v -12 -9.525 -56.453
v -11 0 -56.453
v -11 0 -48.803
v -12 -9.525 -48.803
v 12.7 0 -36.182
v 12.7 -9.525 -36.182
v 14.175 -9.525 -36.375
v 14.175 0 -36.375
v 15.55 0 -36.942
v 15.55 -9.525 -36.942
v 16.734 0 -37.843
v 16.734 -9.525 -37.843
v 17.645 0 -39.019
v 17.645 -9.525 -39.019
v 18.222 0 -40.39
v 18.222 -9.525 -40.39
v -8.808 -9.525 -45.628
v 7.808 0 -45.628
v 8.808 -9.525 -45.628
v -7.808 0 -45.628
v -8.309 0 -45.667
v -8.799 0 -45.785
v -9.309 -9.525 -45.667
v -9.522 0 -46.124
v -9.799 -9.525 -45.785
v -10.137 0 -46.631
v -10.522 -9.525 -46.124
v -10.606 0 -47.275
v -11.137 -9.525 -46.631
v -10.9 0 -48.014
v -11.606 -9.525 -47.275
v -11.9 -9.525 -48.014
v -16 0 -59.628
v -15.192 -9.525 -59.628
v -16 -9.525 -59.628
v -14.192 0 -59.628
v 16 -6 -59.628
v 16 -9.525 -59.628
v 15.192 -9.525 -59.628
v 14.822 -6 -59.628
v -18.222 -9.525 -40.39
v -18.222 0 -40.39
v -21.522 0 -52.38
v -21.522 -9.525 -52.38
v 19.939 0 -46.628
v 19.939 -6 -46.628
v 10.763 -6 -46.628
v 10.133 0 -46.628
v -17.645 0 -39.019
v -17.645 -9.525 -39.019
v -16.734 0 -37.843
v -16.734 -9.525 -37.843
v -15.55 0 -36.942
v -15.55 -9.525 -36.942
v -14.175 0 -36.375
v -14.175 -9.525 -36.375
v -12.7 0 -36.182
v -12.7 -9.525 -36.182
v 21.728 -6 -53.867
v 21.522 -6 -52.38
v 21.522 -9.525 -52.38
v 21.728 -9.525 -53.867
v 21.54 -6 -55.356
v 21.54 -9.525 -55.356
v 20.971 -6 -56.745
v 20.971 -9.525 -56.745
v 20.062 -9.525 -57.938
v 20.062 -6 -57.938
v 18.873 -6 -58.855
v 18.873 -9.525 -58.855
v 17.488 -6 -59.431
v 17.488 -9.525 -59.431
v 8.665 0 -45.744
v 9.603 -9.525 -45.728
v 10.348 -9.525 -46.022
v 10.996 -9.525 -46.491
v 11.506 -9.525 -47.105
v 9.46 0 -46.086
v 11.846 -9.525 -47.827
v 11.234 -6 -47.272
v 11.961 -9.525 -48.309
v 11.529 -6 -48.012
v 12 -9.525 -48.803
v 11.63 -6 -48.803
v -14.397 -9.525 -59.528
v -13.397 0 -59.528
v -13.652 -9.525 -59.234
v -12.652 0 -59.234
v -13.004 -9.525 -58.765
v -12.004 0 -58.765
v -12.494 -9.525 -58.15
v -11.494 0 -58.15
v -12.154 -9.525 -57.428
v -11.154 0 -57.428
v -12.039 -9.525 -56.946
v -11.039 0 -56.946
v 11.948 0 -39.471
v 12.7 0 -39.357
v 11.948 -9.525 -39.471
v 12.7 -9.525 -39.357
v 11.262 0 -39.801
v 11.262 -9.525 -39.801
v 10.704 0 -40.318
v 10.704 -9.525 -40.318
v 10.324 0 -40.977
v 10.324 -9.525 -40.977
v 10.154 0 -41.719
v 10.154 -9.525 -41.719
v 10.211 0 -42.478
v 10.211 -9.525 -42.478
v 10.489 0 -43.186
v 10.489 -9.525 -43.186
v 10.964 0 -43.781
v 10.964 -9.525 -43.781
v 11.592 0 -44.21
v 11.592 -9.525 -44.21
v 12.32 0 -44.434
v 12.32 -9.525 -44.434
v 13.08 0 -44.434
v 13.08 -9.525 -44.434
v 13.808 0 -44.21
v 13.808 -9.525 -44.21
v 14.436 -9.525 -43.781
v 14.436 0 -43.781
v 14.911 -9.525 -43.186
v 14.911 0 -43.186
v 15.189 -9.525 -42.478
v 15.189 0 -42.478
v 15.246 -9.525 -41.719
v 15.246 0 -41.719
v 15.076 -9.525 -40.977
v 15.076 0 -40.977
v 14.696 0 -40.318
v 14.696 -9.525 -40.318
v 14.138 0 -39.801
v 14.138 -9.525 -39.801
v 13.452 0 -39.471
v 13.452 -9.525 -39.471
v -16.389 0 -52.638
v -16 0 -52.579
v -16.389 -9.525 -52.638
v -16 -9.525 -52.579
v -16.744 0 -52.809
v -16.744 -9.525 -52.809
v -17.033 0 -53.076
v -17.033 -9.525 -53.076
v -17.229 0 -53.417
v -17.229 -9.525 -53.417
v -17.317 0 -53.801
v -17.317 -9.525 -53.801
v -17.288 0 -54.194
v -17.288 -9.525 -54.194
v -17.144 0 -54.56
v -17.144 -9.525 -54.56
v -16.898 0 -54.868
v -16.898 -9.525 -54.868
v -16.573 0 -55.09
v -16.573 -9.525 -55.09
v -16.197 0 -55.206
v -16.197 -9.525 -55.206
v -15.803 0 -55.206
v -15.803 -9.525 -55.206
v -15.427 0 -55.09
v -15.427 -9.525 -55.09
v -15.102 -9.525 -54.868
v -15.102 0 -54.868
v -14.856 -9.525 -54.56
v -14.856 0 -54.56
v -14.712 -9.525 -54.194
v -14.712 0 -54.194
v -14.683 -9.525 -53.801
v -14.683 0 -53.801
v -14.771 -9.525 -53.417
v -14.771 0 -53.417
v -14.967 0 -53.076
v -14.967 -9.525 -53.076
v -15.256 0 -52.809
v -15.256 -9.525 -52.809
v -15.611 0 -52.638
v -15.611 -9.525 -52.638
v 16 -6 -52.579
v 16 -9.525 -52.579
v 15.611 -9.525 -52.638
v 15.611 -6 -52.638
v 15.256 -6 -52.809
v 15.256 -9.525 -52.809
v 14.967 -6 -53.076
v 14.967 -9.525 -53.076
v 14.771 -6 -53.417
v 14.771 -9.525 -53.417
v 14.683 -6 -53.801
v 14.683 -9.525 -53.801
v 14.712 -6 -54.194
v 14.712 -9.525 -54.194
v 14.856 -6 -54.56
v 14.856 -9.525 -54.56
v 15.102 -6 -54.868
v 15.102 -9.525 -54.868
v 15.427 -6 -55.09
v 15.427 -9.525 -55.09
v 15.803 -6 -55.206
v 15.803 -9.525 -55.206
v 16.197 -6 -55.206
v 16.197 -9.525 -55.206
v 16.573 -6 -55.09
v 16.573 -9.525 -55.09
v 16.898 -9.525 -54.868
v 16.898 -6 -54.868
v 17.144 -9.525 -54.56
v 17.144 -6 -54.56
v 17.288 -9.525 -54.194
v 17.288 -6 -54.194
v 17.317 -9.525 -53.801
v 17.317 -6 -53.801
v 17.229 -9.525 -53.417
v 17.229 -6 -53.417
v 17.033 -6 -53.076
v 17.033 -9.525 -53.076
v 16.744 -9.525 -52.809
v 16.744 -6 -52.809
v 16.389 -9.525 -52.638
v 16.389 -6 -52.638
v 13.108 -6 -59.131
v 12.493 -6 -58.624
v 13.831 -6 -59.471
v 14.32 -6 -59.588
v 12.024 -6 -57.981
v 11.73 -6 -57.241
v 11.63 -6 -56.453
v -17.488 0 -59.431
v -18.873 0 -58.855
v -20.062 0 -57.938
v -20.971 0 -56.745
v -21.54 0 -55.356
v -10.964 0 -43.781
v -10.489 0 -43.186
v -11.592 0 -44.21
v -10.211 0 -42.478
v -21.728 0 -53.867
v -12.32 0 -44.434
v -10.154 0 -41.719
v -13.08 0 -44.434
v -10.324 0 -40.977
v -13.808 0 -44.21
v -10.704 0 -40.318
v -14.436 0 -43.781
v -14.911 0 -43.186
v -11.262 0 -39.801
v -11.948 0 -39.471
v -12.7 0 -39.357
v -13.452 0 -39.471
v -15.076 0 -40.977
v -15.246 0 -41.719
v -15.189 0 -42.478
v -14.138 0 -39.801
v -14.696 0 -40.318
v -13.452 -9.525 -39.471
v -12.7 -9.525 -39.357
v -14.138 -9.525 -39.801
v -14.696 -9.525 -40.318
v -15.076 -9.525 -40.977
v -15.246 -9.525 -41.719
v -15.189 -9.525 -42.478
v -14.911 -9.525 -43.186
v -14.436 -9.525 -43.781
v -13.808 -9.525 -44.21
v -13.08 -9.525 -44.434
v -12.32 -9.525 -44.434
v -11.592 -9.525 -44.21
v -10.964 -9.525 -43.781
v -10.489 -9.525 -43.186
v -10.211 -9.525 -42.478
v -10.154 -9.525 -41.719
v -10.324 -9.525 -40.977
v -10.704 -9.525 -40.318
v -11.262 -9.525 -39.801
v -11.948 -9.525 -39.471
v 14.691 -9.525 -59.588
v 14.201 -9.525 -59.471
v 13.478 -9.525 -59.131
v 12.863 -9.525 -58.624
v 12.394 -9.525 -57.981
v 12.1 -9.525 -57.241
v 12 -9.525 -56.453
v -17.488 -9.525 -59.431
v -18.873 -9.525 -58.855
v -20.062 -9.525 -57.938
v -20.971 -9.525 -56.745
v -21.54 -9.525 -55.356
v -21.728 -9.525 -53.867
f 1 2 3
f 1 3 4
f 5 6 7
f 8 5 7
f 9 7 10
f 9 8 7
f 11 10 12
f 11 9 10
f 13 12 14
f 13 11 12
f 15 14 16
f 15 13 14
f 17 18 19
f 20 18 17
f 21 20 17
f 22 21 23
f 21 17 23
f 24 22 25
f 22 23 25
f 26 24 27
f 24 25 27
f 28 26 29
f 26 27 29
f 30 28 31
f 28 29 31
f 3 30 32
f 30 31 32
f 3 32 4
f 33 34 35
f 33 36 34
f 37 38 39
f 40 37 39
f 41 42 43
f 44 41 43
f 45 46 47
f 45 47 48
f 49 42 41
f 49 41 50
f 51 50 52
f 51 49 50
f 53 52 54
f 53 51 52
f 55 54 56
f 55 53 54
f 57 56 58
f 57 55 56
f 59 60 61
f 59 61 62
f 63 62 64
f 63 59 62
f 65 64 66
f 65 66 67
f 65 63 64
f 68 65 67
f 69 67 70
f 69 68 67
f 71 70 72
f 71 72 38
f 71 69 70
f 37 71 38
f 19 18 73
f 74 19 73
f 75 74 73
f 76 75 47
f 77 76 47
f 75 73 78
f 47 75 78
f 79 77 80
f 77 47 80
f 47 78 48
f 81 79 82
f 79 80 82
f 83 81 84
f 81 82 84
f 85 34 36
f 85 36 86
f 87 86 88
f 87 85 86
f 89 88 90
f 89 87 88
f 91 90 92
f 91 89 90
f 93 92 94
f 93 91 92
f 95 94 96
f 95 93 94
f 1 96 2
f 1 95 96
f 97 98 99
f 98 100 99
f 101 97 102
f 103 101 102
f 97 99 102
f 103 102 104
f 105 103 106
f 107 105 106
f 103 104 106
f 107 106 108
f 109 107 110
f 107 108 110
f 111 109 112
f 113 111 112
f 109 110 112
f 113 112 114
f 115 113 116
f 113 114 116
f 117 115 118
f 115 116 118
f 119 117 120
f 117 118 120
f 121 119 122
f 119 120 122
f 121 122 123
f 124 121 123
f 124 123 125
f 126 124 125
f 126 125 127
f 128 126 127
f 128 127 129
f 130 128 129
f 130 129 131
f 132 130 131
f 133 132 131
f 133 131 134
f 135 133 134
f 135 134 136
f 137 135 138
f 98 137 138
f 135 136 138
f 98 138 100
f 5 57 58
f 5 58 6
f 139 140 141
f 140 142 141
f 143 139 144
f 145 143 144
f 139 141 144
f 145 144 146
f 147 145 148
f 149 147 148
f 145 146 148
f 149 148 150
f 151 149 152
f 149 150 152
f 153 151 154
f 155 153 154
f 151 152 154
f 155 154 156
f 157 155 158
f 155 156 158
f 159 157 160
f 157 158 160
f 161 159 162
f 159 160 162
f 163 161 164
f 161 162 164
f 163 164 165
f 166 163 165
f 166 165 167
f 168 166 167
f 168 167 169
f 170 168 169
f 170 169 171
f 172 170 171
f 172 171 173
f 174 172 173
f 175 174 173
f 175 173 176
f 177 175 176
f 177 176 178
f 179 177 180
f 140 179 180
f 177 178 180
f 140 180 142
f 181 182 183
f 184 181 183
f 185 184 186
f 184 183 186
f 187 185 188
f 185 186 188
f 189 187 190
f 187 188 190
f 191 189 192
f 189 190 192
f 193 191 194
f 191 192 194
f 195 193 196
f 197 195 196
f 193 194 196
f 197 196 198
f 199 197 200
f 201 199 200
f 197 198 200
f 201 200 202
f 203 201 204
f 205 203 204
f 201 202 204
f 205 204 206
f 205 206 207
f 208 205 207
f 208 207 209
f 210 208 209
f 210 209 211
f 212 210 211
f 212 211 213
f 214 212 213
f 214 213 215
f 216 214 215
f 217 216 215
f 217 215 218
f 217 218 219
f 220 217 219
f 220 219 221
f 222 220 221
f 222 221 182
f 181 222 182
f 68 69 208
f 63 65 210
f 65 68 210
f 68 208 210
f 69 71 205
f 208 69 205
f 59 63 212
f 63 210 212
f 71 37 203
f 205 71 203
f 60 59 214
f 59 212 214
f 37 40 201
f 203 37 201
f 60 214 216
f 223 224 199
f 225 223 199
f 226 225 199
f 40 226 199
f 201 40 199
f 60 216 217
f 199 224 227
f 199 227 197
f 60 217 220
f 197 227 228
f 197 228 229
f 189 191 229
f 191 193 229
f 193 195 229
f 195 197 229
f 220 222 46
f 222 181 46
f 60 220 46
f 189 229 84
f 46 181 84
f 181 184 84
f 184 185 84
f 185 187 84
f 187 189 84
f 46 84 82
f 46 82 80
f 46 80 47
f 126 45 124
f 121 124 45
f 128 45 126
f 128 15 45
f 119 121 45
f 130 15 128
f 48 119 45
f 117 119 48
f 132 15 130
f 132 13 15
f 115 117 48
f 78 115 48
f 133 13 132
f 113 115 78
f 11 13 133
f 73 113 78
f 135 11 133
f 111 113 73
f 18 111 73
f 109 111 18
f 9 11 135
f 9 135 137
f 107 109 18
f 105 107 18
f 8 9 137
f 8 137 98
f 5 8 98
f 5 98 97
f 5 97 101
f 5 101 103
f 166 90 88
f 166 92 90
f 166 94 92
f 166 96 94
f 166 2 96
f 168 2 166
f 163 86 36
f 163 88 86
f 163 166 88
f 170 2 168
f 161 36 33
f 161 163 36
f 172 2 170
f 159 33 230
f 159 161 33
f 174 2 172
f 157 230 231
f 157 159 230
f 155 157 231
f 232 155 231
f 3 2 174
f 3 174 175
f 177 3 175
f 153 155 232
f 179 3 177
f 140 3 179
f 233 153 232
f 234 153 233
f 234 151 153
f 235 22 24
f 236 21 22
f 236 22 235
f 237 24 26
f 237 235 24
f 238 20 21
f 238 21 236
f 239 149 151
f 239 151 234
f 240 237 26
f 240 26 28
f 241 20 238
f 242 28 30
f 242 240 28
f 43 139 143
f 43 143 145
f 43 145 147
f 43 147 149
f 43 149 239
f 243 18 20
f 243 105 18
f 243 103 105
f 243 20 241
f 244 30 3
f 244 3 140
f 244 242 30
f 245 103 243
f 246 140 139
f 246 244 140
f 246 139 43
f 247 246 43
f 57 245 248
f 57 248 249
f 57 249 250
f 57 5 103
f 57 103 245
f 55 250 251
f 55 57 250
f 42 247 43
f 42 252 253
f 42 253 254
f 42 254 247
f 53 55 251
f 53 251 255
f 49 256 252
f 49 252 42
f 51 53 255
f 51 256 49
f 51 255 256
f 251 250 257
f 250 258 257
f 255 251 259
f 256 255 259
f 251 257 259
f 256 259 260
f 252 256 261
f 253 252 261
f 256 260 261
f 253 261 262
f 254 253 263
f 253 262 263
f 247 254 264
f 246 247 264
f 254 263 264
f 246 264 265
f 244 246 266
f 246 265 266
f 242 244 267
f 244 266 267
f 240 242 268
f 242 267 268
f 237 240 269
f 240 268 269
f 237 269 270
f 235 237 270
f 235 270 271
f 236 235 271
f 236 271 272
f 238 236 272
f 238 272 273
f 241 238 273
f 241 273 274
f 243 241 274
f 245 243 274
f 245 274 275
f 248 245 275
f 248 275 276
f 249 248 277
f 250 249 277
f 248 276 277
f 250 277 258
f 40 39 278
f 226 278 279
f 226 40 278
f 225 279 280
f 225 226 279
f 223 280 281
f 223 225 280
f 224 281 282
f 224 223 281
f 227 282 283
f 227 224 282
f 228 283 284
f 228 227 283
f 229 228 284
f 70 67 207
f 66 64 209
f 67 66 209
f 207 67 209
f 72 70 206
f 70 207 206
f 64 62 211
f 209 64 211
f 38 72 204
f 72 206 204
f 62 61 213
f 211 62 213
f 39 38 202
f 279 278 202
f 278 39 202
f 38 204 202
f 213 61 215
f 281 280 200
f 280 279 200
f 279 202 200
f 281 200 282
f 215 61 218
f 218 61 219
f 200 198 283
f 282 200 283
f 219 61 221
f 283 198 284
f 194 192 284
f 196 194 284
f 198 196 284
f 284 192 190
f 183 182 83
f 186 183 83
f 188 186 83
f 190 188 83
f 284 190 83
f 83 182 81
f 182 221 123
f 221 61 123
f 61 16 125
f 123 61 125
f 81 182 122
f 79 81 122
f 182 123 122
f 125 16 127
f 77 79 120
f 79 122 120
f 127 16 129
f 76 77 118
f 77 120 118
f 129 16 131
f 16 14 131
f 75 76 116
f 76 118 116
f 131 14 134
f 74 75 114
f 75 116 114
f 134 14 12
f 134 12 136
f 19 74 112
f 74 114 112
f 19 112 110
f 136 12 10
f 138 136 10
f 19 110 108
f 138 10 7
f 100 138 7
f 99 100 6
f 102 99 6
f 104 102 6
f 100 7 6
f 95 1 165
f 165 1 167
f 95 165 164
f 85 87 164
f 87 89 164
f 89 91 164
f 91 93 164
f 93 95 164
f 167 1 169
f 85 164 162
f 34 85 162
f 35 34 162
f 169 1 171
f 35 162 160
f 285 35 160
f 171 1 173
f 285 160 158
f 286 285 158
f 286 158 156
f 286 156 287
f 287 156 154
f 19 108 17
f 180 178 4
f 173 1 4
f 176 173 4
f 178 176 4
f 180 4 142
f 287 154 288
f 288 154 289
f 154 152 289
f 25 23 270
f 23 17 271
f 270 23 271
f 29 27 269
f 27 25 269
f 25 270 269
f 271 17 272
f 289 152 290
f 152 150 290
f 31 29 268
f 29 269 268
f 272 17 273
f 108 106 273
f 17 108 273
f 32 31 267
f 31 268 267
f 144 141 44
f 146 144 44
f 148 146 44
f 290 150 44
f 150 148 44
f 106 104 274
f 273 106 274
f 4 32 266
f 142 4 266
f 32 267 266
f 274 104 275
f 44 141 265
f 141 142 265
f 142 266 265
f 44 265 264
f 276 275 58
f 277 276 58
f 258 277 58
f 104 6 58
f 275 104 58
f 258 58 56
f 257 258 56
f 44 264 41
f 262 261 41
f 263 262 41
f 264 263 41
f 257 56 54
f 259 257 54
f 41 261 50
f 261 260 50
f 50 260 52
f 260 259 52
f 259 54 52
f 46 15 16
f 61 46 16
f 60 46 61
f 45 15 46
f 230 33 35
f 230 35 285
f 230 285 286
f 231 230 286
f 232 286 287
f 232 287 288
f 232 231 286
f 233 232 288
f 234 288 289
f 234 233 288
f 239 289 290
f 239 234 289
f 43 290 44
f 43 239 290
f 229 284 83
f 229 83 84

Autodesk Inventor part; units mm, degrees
ref_plane "YZ Plane" through (0, 0, 0) normal (1, 0, 0) x (0, 1, 0)
ref_plane "XZ Plane" through (0, 0, 0) normal (0, 1, 0) x (-1, 0, 0)
ref_plane "XY Plane" through (0, 0, 0) normal (0, 0, 1) x (1, 0, 0)
sketch "Sketch1" plane through (0, 0, 0) normal (0, 1, 0) x (-1, 0, 0)
  circle A0 centre (0, 0) radius 14.351 construction
  line L0 (-12.7, -34.925) -> (12.7, -34.925) construction
  circle A1 centre (0, 0) radius 22.225 construction
  circle A2 centre (0, 0) radius 31.75 construction
  circle A3 centre (-15.875, -27.4963) radius 4.7625 construction
  arc A4 (-20.4289, -28.8903) -> (-25.4478, -18.9862) centre (-51.4511, -38.3868) ccw construction
  arc A5 (-3.7186, -31.5315) -> (-14.8053, -32.1371) centre (-7.5184, -63.7513) ccw construction
  line L1 (0, 0) -> (0, -22.225) construction
  circle A6 centre (15.875, -27.4963) radius 4.7625 construction
  arc A7 (25.4478, -18.9862) -> (20.4289, -28.8903) centre (51.4511, -38.3868) ccw construction
  arc A8 (14.8053, -32.1371) -> (3.7186, -31.5315) centre (7.5184, -63.7513) ccw construction
  circle A9 centre (-12.7, -34.925) radius 2.5527 construction
  circle A10 centre (-12.7, -34.925) radius 3.1548 construction
  circle A11 centre (12.7, -34.925) radius 3.1548 construction
  line L2 (-16, -53.9) -> (16, -53.9) construction
  circle A12 centre (0, 0) radius 53.9 construction
  circle A13 centre (0, -40.64) radius 2.5527 construction
  circle A14 centre (12.7, -41.91) radius 2.5527 construction
  point P0 (0, -34.925)
  point P1 (31.75, 0)
  point P2 (15.875, 27.4963)
  point P3 (-15.875, 27.4963)
  point P4 (-31.75, 0)
  point P5 (15.875, -27.4963)
  point P6 (0, -53.9)
  point P7 (0, -53.9)
  point P8 (-12.7, -41.91)
  dimension "d3" = 44.45
  dimension "d16" = 107.8
  dimension "d0" = 28.702
  dimension "d1" = 25.4
  dimension "d2" = 34.925
  dimension "d4" = 63.5
  dimension "d7" = 360
  dimension "d9" = 9.525
  dimension "d10" = 32.4431
  dimension "d11" = 32.4431
  dimension "d12" = 5.1054
  dimension "d14" = 0.6021
  dimension "d15" = 32
  dimension "d18" = 40.64
  dimension "d19" = 5.1054
  dimension "d20" = 6.985
  dimension "d21" = 5.1054
sketch "Sketch2" plane through (0, 0, 0) normal (0, 1, 0) x (-1, 0, 0)
  circle A0 centre (12.7, -41.91) radius 2.5527 construction
  circle A1 centre (12.7, -41.91) radius 5.7277 construction
  circle A2 centre (16, -53.9) radius 5.7277 construction
  line L0 (18.2224, -40.3901) -> (21.5224, -52.3801)
  circle A3 centre (-12.7, -41.91) radius 5.7277 construction
  circle A4 centre (-16, -53.9) radius 5.7277 construction
  line L1 (12.7, -36.1823) -> (-12.7, -36.1823)
  line L2 (-18.2224, -40.3901) -> (-21.5224, -52.3801)
  line L3 (-16, -59.6277) -> (16, -59.6277)
  arc A5 (18.2224, -40.3901) -> (12.7, -36.1823) centre (12.7, -41.91) ccw
  arc A6 (16, -59.6277) -> (21.5224, -52.3801) centre (16, -53.9) ccw
  arc A7 (-21.5224, -52.3801) -> (-16, -59.6277) centre (-16, -53.9) ccw
  arc A8 (-12.7, -36.1823) -> (-18.2224, -40.3901) centre (-12.7, -41.91) ccw
  line L4 (-12, -59.6277) -> (-12, -44.1197) construction
  line L5 (-12, -44.1197) -> (12, -44.1197) construction
  line L6 (12, -44.1197) -> (12, -59.6277) construction
  line L7 (12, -59.6277) -> (-12, -59.6277)
  line L8 (11, -44.1197) -> (-11, -44.1197)
  line L9 (-11, -44.1197) -> (-12, -59.6277)
  line L10 (11, -44.1197) -> (12, -59.6277)
  point P0 (0, 0)
  point P1 (0, -59.6277)
  point P2 (12, -59.6277)
  point P3 (0, -44.1197)
  point P4 (0, -44.1197)
  point P5 (12, -59.6277)
  dimension "d22" = 5.1054
  dimension "d23" = 3.175
  dimension "d40" = 24
  dimension "d41" = 15.508
  dimension "d45" = 22
extrude "Extrusion1" add sketch "Sketch2" against normal blind 9.525
hole "Hole1" at (-12.7, 0, -41.91) at (12.7, 0, -41.91) direction (0, -1, 0) diameter 5.1054 end through all clearance for "Flat Head Machine Screw (82)" size "#10" standard "Ansi Unified Screw Threads"
hole "Hole2" at (16, 0, -53.9) at (-16, 0, -53.9) direction (0, -1, 0) diameter 2.6416 end through all thread size "6-32 UNC" class "2B" standard "ANSI Unified Screw Threads"
sketch "Sketch3" plane through (0, -9.525, 0) normal (0, -1, 0) x (1, 0, 0)
  point P0 (0, 0)
sketch "Sketch4" plane through (16, 0, -59.6277) normal (0, 0, -1) x (-1, 0, 0)
  line L0 (28.7, 0) -> (3.3, 0) construction
  line L1 (5, 0) -> (27, 0)
  line L2 (27, 0) -> (28, -9.525)
  line L3 (28, -9.525) -> (4, -9.525)
  line L4 (3.3, -9.525) -> (28.7, -9.525) construction
  line L5 (4, -9.525) -> (5, 0)
  point P0 (16, 0)
  point P1 (16, 0)
  point P2 (16, -9.525)
  point P3 (16, -9.525)
  dimension "d46" = 22
  dimension "d47" = 24
extrude "Extrusion3" cut sketch "Sketch4" against normal blind 14
fillet "Fillet2" radius 3.175 4 edges at (11.5, -4.7625, -45.6277) (-11.5, -4.7625, -45.6277) (-11.5, -4.7625, -59.6277) (11.5, -4.7625, -59.6277)
sketch "Sketch5" plane through (0, 0, 0) normal (1, 0, 0) x (0, 1, 0)
  line L0 (-9.525, -45.6277) -> (-9.525, -36.1823) construction
  line L1 (-9.525, -36.1823) -> (0, -36.1823) construction
  line L2 (0, -36.1823) -> (0, -45.6277) construction
  line L3 (0, -45.6277) -> (-9.525, -45.6277) construction
  line L4 (0, -59.6277) -> (-6, -59.6277)
  line L5 (-6, -59.6277) -> (-6, -46.6277)
  line L6 (-6, -46.6277) -> (0, -46.6277)
  line L7 (0, -46.6277) -> (0, -59.6277)
  line L8 (-9.525, -59.6277) -> (0, -59.6277) construction
  line L9 (-9.525, -56.4527) -> (-9.525, -48.8027) construction
  point P0 (0, 0)
  dimension "d55" = 6
  dimension "d56" = 13
extrude "Extrusion4" cut sketch "Sketch5" along normal blind 25.4
equation "\"d11\" = d10"
properties part number "AR-020" material "ABS Plastic"
